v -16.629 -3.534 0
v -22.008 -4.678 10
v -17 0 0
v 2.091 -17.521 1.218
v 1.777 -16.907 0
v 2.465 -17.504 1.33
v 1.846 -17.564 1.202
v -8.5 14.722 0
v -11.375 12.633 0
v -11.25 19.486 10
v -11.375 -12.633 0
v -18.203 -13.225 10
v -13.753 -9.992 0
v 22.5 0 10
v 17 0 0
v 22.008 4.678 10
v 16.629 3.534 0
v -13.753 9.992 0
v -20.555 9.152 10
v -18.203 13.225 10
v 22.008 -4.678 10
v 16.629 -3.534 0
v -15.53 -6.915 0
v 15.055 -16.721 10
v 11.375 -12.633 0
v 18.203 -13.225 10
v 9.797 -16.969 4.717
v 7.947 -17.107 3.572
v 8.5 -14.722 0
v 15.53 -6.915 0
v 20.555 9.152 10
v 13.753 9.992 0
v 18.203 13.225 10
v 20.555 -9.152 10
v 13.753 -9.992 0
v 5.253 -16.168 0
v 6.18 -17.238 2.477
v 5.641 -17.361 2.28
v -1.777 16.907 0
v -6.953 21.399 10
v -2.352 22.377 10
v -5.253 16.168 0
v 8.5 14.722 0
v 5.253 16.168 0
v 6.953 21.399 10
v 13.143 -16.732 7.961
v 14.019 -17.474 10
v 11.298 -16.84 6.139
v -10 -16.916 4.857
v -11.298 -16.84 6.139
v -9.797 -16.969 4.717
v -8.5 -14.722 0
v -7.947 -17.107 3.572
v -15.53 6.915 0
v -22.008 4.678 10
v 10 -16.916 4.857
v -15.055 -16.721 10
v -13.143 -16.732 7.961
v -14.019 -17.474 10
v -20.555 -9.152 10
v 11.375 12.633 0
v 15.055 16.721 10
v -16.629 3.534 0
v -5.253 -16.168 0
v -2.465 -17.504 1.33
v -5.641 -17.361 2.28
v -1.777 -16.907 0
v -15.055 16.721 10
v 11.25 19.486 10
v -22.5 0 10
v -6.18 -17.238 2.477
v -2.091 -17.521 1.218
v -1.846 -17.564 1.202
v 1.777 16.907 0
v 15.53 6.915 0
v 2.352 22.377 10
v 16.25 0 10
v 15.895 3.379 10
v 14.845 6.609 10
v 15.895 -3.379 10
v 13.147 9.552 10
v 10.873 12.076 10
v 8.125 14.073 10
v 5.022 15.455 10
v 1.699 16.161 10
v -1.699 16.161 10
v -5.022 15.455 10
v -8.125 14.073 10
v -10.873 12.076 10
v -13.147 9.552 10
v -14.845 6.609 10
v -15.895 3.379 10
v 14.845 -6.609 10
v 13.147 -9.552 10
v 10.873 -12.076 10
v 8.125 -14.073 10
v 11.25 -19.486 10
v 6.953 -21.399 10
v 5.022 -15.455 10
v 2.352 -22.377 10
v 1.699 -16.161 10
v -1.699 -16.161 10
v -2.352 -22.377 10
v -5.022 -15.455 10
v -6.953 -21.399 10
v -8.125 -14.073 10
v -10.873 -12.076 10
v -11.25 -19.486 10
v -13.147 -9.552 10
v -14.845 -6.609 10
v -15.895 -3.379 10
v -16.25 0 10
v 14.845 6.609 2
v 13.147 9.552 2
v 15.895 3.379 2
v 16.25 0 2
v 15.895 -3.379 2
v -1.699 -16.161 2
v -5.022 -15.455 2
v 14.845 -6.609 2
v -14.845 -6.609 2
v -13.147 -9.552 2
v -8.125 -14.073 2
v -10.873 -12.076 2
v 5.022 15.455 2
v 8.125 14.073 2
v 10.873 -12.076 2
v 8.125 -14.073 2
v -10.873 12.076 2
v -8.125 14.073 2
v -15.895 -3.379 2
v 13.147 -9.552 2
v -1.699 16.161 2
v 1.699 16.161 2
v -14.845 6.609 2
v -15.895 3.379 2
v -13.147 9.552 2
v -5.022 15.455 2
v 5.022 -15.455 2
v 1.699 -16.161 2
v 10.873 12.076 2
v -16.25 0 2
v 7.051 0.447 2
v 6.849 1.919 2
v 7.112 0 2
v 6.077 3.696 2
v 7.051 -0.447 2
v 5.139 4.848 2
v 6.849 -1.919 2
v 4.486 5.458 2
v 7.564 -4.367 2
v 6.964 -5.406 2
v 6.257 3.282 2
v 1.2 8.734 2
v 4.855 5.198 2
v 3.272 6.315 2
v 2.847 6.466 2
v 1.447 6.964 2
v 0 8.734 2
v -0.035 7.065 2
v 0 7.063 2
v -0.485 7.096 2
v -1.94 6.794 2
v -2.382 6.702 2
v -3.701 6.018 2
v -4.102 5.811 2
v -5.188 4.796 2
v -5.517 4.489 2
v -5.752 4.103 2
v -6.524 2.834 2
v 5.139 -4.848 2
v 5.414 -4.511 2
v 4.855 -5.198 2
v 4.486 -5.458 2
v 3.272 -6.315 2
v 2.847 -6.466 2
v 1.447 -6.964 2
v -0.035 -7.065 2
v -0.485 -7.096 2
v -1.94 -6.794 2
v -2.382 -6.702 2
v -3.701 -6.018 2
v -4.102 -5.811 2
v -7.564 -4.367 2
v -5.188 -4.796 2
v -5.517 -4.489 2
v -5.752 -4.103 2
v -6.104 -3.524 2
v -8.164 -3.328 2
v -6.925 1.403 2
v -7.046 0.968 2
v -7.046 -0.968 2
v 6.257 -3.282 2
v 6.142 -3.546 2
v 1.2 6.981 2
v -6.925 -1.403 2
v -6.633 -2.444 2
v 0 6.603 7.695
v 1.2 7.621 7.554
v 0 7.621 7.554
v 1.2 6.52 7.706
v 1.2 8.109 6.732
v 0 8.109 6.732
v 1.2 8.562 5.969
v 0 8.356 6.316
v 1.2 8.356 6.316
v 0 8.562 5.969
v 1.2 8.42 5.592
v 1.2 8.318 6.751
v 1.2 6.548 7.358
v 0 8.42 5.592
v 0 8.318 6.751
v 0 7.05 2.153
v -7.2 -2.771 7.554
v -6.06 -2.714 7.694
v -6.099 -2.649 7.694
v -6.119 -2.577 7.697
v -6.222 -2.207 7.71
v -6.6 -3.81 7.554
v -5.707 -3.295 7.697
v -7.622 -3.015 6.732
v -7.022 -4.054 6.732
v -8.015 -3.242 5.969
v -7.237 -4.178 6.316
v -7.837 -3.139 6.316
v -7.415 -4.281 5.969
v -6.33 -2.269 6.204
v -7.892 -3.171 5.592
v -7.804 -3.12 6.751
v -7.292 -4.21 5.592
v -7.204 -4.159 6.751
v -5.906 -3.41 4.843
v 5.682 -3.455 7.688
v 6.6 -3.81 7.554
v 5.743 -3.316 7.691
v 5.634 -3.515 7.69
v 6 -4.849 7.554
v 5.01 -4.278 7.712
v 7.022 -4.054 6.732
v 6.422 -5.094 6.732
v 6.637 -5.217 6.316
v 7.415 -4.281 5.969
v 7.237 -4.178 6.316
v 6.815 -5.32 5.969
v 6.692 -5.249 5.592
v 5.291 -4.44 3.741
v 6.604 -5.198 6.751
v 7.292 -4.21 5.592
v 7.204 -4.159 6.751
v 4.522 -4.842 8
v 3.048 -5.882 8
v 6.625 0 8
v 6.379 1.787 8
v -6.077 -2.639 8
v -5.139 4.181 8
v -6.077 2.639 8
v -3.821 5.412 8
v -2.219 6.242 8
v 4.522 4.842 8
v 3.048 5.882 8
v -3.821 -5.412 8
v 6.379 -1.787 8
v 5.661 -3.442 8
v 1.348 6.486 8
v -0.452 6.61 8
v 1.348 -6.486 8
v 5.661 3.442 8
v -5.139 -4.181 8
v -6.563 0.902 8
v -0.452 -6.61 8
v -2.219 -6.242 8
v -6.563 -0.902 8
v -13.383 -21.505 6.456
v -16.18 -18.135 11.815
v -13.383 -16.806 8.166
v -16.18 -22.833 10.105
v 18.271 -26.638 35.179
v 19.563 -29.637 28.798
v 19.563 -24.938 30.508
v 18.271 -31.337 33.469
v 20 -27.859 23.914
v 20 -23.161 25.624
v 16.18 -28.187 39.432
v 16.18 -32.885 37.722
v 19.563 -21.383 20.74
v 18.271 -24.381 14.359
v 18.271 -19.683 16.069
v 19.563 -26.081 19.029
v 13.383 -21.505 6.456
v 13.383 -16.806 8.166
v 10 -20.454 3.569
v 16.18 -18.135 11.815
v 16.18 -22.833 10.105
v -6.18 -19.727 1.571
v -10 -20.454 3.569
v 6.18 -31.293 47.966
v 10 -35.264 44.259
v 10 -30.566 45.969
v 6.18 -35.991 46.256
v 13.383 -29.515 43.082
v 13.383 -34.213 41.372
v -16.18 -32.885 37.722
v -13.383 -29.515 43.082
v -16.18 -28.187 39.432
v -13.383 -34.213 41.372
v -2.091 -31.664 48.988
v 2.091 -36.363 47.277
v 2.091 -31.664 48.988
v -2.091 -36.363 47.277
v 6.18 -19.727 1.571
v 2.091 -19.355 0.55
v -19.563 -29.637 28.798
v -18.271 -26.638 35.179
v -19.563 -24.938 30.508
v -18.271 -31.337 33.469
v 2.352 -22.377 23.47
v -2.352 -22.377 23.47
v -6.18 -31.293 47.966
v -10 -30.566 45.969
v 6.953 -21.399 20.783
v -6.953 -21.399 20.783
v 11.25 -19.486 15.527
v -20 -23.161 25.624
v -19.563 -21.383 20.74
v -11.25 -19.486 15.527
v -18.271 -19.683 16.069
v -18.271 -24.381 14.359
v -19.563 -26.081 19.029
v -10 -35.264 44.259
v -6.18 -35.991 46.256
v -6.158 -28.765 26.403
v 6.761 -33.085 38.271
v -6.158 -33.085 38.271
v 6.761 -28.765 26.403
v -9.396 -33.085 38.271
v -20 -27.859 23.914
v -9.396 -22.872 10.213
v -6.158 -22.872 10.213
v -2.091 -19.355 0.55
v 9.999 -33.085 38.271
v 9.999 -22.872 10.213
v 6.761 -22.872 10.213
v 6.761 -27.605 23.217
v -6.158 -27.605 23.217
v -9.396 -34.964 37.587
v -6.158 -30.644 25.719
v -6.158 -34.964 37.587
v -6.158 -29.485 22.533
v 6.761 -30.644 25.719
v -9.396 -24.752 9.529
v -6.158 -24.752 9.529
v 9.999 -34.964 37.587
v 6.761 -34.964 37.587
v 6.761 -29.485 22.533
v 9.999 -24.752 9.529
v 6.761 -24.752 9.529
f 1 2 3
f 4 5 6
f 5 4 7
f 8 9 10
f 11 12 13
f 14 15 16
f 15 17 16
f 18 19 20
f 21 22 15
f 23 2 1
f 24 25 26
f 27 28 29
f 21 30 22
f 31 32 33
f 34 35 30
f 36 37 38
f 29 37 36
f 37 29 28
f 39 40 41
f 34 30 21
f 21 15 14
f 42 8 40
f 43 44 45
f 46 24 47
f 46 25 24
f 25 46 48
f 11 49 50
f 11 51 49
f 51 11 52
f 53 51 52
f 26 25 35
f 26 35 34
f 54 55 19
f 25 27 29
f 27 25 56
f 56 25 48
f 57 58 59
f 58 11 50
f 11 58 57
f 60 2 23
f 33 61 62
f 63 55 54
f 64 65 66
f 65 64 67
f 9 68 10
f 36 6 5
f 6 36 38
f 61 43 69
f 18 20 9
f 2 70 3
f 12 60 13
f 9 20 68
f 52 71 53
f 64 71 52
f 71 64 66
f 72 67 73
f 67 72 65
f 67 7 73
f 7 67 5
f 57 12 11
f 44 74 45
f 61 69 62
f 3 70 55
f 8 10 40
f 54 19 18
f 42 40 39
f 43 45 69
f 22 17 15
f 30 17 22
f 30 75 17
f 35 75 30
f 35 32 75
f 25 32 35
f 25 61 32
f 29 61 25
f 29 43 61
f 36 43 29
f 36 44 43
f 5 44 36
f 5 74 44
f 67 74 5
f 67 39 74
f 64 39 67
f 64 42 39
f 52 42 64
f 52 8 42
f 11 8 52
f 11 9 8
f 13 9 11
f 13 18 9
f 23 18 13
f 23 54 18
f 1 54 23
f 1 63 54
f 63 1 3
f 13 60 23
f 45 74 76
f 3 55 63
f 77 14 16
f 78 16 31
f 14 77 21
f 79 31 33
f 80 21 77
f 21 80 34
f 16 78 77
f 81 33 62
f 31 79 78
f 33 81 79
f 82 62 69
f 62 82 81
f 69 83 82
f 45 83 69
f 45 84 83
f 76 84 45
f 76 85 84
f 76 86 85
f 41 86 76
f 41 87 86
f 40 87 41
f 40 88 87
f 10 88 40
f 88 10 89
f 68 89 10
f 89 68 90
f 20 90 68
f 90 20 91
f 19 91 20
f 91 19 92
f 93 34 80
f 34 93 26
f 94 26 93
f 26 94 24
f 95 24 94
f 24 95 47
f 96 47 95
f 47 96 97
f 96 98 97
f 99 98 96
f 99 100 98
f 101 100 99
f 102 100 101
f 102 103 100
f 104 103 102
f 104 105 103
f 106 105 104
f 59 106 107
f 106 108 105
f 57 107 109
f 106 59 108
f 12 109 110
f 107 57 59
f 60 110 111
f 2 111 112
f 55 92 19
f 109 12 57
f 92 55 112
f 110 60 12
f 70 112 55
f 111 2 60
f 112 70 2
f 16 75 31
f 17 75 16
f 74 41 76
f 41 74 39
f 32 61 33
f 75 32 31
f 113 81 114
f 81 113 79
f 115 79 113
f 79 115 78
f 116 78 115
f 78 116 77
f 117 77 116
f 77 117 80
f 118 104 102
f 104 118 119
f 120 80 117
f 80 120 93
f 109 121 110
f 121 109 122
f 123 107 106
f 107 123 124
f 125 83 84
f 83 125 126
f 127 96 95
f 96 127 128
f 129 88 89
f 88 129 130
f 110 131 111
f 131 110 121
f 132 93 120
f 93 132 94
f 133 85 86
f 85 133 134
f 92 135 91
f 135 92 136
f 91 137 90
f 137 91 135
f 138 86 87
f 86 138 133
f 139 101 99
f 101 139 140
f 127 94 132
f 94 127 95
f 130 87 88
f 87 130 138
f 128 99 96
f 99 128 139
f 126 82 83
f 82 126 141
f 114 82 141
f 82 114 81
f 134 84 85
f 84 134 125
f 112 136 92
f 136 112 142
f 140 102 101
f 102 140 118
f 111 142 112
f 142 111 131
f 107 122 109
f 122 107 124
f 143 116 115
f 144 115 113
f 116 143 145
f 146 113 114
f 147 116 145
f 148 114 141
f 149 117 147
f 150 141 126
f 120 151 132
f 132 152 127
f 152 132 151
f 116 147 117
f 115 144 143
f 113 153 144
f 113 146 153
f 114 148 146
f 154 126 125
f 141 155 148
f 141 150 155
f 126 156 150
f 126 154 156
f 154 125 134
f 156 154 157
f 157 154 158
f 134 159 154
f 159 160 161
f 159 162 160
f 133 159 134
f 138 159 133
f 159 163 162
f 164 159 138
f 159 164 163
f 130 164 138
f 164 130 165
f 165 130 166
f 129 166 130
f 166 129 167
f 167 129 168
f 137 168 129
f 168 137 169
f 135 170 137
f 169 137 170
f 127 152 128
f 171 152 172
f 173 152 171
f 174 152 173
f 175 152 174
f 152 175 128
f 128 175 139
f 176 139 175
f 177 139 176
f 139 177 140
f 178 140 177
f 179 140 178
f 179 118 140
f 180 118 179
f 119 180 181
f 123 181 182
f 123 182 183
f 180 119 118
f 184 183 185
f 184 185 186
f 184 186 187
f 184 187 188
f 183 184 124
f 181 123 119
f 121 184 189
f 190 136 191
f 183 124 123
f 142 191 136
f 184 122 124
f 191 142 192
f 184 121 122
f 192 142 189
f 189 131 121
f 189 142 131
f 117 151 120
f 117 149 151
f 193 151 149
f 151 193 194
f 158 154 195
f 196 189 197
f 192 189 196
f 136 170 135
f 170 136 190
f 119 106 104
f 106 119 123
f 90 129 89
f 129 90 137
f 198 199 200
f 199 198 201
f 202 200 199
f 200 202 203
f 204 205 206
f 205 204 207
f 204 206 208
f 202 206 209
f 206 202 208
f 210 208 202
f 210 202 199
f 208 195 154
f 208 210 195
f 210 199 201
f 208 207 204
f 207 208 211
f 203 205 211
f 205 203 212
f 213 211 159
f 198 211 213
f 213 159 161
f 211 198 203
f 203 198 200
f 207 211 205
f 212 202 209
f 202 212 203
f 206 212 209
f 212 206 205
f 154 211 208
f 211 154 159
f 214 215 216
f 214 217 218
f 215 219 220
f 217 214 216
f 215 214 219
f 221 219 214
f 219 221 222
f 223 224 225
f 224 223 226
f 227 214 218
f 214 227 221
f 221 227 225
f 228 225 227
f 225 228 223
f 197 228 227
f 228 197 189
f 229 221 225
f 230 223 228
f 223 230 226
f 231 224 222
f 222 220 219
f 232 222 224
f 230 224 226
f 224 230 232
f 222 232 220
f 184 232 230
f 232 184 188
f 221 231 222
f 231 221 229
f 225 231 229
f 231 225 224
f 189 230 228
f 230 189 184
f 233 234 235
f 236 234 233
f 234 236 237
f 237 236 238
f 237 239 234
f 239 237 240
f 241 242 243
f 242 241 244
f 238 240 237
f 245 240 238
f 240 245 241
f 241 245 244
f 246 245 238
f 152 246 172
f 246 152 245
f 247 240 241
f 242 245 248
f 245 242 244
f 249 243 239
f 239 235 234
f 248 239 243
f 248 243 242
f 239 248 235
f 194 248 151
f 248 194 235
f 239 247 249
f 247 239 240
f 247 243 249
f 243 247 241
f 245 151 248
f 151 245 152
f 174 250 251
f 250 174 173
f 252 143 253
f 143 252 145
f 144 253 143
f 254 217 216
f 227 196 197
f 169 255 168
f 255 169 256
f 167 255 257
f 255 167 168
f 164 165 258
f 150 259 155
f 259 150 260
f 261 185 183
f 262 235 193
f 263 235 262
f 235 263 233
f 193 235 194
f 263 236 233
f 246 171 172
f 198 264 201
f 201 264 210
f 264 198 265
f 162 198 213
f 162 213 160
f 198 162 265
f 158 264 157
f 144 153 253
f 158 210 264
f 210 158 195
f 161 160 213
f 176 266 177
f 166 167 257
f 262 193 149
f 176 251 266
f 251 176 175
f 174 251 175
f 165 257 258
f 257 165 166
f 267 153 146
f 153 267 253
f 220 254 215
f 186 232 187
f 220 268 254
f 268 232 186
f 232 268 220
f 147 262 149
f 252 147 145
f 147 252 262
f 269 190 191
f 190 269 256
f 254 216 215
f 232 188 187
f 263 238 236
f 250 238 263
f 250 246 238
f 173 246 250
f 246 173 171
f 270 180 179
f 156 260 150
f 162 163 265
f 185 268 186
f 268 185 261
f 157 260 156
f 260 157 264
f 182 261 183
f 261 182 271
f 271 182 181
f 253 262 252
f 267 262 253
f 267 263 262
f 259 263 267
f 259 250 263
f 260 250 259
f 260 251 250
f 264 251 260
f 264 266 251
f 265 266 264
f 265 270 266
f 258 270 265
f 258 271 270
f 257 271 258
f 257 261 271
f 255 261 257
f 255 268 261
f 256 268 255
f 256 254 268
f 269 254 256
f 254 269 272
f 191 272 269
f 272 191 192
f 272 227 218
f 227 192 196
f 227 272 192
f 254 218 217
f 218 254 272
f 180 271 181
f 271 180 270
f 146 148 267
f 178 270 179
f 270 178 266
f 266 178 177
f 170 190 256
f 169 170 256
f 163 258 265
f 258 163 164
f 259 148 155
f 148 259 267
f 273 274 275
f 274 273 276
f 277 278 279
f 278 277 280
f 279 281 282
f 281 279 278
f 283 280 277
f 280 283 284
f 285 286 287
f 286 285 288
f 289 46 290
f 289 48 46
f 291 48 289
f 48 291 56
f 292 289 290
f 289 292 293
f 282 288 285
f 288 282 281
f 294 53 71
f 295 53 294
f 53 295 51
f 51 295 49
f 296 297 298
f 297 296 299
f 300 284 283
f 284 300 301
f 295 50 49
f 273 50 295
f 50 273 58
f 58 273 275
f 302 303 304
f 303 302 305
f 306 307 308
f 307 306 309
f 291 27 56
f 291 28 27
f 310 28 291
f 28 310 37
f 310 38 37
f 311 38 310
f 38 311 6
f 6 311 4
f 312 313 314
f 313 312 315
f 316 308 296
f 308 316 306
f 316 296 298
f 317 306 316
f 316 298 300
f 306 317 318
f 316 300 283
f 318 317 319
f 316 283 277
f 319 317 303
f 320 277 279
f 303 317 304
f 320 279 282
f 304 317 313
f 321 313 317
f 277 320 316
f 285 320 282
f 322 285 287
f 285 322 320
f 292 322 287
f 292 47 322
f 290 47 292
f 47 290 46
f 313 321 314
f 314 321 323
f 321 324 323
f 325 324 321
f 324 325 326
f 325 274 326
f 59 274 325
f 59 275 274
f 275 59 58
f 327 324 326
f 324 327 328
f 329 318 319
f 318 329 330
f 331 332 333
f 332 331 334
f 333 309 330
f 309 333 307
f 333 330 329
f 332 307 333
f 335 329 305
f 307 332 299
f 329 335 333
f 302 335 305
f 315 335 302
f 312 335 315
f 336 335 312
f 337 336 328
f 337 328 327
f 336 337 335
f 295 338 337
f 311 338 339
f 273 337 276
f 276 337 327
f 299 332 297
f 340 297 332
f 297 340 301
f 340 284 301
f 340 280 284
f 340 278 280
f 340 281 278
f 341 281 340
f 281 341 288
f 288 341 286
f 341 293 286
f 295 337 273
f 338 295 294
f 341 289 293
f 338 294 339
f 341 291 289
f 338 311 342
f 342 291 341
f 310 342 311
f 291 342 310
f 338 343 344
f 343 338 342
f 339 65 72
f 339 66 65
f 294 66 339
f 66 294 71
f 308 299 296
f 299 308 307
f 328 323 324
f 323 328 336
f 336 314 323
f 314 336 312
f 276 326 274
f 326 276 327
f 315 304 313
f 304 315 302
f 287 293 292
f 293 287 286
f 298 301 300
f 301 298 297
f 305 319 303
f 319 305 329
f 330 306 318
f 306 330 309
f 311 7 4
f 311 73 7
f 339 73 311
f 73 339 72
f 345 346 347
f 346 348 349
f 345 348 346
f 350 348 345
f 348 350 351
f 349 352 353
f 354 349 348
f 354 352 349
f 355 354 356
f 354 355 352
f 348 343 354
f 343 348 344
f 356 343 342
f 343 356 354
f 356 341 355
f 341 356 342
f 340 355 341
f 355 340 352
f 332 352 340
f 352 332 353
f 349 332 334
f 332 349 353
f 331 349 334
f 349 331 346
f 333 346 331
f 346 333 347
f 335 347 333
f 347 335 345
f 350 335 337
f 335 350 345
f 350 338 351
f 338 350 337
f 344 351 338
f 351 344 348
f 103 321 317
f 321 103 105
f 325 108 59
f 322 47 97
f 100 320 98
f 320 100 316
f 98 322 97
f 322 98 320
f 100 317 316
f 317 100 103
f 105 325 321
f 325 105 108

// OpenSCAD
// 
// LittlePeople chair, teeter totter
//

initial = "H"; // [A,B,C,D,E,F,G,H,I,J,K,L,M,N,O,P,Q,R,S,T,U,V,W,X,Y,Z]
toy     = "Chair"; // [Chair, Teeter Totter]

module little_people_base() {
	nub_height = 6;
	nub_angle = 5;
	nub_width  = 1.2;
	
	union() {
		// for Little People Princess style
		difference() {
			cylinder(d1=34, d2=45, h=10);
		
			translate([0,0,2]) 
				cylinder(d=32.5, h=10);
		}
		// for standard Little People
		cylinder(d1=14.55, d2=13.25, h=8);

		rotate([nub_angle, 0, 0])
			translate([0,13.75/2, 0]) 
				union() {

					translate([0, .05, 5.2])
						rotate([90,0,90])
							cylinder(d=4.25, h=nub_width);
					cube([nub_width, 2, nub_height]);
				}
		rotate([nub_angle, 0, 120])
			translate([0,13.75/2, 0]) 
			union() {

					translate([0, .05, 5.2])
						rotate([90,0,90])
							cylinder(d=4.25, h=nub_width);
					cube([nub_width, 2, nub_height]);
				}
		rotate([nub_angle, 0, 240])
			translate([0,13.75/2, 0]) 
			union() {

					translate([0, .05, 5.2])
						rotate([90,0,90])
							cylinder(d=4.25, h=nub_width);
					cube([nub_width, 2, nub_height]);
				}
	}
}


module little_people_negative() {
	union() {
		translate([0,0,10]) 
			cylinder(d=45, h=50);
		
		translate([0,0,2]) 
			cylinder(d=32.5, h=9);
	}
}
/*
cylinder(d=40, h=5);
translate([0,0,3])
	linear_extrude(height = 11, center = true)
		text("A", 20, font="Arial", halign="center", valign="center"); /*, spacing,
     direction, language, script)
*/

if (toy == "Chair") { // [Chair, Teeter Totter]
	// Simple chair back
	union() {
		little_people_base();
		difference() {
			rotate([110,0,0]) 
				translate([0,32,13])
					scale([1,1.25,1])
						union () {
							cylinder(d=40, h=5);
							translate([0,0,4])
								linear_extrude(height = 6, center = true)
									text(initial, 25, font="Arial", halign="center", valign="center");
							 }
			little_people_negative();
		}
	}
}

// Cut away to ease designing
//difference() {
//	cube(30,1);
//	little_people_negative();
//}
//little_people_base();

if (toy == "Teeter Totter") {

	// teeter totter
	translate([-17,-17, 0])
		cube([150, 34, 5]);
	translate([0,0,5]) 
		little_people_base();
	translate([117,0,5])
		little_people_base();

	translate([0,64,0])
		rotate([90,0,0])
		difference() {
			cylinder(d=20, h=34);
			translate([-10,-20,-1])
				cube([20,20,36]);
		}
}
